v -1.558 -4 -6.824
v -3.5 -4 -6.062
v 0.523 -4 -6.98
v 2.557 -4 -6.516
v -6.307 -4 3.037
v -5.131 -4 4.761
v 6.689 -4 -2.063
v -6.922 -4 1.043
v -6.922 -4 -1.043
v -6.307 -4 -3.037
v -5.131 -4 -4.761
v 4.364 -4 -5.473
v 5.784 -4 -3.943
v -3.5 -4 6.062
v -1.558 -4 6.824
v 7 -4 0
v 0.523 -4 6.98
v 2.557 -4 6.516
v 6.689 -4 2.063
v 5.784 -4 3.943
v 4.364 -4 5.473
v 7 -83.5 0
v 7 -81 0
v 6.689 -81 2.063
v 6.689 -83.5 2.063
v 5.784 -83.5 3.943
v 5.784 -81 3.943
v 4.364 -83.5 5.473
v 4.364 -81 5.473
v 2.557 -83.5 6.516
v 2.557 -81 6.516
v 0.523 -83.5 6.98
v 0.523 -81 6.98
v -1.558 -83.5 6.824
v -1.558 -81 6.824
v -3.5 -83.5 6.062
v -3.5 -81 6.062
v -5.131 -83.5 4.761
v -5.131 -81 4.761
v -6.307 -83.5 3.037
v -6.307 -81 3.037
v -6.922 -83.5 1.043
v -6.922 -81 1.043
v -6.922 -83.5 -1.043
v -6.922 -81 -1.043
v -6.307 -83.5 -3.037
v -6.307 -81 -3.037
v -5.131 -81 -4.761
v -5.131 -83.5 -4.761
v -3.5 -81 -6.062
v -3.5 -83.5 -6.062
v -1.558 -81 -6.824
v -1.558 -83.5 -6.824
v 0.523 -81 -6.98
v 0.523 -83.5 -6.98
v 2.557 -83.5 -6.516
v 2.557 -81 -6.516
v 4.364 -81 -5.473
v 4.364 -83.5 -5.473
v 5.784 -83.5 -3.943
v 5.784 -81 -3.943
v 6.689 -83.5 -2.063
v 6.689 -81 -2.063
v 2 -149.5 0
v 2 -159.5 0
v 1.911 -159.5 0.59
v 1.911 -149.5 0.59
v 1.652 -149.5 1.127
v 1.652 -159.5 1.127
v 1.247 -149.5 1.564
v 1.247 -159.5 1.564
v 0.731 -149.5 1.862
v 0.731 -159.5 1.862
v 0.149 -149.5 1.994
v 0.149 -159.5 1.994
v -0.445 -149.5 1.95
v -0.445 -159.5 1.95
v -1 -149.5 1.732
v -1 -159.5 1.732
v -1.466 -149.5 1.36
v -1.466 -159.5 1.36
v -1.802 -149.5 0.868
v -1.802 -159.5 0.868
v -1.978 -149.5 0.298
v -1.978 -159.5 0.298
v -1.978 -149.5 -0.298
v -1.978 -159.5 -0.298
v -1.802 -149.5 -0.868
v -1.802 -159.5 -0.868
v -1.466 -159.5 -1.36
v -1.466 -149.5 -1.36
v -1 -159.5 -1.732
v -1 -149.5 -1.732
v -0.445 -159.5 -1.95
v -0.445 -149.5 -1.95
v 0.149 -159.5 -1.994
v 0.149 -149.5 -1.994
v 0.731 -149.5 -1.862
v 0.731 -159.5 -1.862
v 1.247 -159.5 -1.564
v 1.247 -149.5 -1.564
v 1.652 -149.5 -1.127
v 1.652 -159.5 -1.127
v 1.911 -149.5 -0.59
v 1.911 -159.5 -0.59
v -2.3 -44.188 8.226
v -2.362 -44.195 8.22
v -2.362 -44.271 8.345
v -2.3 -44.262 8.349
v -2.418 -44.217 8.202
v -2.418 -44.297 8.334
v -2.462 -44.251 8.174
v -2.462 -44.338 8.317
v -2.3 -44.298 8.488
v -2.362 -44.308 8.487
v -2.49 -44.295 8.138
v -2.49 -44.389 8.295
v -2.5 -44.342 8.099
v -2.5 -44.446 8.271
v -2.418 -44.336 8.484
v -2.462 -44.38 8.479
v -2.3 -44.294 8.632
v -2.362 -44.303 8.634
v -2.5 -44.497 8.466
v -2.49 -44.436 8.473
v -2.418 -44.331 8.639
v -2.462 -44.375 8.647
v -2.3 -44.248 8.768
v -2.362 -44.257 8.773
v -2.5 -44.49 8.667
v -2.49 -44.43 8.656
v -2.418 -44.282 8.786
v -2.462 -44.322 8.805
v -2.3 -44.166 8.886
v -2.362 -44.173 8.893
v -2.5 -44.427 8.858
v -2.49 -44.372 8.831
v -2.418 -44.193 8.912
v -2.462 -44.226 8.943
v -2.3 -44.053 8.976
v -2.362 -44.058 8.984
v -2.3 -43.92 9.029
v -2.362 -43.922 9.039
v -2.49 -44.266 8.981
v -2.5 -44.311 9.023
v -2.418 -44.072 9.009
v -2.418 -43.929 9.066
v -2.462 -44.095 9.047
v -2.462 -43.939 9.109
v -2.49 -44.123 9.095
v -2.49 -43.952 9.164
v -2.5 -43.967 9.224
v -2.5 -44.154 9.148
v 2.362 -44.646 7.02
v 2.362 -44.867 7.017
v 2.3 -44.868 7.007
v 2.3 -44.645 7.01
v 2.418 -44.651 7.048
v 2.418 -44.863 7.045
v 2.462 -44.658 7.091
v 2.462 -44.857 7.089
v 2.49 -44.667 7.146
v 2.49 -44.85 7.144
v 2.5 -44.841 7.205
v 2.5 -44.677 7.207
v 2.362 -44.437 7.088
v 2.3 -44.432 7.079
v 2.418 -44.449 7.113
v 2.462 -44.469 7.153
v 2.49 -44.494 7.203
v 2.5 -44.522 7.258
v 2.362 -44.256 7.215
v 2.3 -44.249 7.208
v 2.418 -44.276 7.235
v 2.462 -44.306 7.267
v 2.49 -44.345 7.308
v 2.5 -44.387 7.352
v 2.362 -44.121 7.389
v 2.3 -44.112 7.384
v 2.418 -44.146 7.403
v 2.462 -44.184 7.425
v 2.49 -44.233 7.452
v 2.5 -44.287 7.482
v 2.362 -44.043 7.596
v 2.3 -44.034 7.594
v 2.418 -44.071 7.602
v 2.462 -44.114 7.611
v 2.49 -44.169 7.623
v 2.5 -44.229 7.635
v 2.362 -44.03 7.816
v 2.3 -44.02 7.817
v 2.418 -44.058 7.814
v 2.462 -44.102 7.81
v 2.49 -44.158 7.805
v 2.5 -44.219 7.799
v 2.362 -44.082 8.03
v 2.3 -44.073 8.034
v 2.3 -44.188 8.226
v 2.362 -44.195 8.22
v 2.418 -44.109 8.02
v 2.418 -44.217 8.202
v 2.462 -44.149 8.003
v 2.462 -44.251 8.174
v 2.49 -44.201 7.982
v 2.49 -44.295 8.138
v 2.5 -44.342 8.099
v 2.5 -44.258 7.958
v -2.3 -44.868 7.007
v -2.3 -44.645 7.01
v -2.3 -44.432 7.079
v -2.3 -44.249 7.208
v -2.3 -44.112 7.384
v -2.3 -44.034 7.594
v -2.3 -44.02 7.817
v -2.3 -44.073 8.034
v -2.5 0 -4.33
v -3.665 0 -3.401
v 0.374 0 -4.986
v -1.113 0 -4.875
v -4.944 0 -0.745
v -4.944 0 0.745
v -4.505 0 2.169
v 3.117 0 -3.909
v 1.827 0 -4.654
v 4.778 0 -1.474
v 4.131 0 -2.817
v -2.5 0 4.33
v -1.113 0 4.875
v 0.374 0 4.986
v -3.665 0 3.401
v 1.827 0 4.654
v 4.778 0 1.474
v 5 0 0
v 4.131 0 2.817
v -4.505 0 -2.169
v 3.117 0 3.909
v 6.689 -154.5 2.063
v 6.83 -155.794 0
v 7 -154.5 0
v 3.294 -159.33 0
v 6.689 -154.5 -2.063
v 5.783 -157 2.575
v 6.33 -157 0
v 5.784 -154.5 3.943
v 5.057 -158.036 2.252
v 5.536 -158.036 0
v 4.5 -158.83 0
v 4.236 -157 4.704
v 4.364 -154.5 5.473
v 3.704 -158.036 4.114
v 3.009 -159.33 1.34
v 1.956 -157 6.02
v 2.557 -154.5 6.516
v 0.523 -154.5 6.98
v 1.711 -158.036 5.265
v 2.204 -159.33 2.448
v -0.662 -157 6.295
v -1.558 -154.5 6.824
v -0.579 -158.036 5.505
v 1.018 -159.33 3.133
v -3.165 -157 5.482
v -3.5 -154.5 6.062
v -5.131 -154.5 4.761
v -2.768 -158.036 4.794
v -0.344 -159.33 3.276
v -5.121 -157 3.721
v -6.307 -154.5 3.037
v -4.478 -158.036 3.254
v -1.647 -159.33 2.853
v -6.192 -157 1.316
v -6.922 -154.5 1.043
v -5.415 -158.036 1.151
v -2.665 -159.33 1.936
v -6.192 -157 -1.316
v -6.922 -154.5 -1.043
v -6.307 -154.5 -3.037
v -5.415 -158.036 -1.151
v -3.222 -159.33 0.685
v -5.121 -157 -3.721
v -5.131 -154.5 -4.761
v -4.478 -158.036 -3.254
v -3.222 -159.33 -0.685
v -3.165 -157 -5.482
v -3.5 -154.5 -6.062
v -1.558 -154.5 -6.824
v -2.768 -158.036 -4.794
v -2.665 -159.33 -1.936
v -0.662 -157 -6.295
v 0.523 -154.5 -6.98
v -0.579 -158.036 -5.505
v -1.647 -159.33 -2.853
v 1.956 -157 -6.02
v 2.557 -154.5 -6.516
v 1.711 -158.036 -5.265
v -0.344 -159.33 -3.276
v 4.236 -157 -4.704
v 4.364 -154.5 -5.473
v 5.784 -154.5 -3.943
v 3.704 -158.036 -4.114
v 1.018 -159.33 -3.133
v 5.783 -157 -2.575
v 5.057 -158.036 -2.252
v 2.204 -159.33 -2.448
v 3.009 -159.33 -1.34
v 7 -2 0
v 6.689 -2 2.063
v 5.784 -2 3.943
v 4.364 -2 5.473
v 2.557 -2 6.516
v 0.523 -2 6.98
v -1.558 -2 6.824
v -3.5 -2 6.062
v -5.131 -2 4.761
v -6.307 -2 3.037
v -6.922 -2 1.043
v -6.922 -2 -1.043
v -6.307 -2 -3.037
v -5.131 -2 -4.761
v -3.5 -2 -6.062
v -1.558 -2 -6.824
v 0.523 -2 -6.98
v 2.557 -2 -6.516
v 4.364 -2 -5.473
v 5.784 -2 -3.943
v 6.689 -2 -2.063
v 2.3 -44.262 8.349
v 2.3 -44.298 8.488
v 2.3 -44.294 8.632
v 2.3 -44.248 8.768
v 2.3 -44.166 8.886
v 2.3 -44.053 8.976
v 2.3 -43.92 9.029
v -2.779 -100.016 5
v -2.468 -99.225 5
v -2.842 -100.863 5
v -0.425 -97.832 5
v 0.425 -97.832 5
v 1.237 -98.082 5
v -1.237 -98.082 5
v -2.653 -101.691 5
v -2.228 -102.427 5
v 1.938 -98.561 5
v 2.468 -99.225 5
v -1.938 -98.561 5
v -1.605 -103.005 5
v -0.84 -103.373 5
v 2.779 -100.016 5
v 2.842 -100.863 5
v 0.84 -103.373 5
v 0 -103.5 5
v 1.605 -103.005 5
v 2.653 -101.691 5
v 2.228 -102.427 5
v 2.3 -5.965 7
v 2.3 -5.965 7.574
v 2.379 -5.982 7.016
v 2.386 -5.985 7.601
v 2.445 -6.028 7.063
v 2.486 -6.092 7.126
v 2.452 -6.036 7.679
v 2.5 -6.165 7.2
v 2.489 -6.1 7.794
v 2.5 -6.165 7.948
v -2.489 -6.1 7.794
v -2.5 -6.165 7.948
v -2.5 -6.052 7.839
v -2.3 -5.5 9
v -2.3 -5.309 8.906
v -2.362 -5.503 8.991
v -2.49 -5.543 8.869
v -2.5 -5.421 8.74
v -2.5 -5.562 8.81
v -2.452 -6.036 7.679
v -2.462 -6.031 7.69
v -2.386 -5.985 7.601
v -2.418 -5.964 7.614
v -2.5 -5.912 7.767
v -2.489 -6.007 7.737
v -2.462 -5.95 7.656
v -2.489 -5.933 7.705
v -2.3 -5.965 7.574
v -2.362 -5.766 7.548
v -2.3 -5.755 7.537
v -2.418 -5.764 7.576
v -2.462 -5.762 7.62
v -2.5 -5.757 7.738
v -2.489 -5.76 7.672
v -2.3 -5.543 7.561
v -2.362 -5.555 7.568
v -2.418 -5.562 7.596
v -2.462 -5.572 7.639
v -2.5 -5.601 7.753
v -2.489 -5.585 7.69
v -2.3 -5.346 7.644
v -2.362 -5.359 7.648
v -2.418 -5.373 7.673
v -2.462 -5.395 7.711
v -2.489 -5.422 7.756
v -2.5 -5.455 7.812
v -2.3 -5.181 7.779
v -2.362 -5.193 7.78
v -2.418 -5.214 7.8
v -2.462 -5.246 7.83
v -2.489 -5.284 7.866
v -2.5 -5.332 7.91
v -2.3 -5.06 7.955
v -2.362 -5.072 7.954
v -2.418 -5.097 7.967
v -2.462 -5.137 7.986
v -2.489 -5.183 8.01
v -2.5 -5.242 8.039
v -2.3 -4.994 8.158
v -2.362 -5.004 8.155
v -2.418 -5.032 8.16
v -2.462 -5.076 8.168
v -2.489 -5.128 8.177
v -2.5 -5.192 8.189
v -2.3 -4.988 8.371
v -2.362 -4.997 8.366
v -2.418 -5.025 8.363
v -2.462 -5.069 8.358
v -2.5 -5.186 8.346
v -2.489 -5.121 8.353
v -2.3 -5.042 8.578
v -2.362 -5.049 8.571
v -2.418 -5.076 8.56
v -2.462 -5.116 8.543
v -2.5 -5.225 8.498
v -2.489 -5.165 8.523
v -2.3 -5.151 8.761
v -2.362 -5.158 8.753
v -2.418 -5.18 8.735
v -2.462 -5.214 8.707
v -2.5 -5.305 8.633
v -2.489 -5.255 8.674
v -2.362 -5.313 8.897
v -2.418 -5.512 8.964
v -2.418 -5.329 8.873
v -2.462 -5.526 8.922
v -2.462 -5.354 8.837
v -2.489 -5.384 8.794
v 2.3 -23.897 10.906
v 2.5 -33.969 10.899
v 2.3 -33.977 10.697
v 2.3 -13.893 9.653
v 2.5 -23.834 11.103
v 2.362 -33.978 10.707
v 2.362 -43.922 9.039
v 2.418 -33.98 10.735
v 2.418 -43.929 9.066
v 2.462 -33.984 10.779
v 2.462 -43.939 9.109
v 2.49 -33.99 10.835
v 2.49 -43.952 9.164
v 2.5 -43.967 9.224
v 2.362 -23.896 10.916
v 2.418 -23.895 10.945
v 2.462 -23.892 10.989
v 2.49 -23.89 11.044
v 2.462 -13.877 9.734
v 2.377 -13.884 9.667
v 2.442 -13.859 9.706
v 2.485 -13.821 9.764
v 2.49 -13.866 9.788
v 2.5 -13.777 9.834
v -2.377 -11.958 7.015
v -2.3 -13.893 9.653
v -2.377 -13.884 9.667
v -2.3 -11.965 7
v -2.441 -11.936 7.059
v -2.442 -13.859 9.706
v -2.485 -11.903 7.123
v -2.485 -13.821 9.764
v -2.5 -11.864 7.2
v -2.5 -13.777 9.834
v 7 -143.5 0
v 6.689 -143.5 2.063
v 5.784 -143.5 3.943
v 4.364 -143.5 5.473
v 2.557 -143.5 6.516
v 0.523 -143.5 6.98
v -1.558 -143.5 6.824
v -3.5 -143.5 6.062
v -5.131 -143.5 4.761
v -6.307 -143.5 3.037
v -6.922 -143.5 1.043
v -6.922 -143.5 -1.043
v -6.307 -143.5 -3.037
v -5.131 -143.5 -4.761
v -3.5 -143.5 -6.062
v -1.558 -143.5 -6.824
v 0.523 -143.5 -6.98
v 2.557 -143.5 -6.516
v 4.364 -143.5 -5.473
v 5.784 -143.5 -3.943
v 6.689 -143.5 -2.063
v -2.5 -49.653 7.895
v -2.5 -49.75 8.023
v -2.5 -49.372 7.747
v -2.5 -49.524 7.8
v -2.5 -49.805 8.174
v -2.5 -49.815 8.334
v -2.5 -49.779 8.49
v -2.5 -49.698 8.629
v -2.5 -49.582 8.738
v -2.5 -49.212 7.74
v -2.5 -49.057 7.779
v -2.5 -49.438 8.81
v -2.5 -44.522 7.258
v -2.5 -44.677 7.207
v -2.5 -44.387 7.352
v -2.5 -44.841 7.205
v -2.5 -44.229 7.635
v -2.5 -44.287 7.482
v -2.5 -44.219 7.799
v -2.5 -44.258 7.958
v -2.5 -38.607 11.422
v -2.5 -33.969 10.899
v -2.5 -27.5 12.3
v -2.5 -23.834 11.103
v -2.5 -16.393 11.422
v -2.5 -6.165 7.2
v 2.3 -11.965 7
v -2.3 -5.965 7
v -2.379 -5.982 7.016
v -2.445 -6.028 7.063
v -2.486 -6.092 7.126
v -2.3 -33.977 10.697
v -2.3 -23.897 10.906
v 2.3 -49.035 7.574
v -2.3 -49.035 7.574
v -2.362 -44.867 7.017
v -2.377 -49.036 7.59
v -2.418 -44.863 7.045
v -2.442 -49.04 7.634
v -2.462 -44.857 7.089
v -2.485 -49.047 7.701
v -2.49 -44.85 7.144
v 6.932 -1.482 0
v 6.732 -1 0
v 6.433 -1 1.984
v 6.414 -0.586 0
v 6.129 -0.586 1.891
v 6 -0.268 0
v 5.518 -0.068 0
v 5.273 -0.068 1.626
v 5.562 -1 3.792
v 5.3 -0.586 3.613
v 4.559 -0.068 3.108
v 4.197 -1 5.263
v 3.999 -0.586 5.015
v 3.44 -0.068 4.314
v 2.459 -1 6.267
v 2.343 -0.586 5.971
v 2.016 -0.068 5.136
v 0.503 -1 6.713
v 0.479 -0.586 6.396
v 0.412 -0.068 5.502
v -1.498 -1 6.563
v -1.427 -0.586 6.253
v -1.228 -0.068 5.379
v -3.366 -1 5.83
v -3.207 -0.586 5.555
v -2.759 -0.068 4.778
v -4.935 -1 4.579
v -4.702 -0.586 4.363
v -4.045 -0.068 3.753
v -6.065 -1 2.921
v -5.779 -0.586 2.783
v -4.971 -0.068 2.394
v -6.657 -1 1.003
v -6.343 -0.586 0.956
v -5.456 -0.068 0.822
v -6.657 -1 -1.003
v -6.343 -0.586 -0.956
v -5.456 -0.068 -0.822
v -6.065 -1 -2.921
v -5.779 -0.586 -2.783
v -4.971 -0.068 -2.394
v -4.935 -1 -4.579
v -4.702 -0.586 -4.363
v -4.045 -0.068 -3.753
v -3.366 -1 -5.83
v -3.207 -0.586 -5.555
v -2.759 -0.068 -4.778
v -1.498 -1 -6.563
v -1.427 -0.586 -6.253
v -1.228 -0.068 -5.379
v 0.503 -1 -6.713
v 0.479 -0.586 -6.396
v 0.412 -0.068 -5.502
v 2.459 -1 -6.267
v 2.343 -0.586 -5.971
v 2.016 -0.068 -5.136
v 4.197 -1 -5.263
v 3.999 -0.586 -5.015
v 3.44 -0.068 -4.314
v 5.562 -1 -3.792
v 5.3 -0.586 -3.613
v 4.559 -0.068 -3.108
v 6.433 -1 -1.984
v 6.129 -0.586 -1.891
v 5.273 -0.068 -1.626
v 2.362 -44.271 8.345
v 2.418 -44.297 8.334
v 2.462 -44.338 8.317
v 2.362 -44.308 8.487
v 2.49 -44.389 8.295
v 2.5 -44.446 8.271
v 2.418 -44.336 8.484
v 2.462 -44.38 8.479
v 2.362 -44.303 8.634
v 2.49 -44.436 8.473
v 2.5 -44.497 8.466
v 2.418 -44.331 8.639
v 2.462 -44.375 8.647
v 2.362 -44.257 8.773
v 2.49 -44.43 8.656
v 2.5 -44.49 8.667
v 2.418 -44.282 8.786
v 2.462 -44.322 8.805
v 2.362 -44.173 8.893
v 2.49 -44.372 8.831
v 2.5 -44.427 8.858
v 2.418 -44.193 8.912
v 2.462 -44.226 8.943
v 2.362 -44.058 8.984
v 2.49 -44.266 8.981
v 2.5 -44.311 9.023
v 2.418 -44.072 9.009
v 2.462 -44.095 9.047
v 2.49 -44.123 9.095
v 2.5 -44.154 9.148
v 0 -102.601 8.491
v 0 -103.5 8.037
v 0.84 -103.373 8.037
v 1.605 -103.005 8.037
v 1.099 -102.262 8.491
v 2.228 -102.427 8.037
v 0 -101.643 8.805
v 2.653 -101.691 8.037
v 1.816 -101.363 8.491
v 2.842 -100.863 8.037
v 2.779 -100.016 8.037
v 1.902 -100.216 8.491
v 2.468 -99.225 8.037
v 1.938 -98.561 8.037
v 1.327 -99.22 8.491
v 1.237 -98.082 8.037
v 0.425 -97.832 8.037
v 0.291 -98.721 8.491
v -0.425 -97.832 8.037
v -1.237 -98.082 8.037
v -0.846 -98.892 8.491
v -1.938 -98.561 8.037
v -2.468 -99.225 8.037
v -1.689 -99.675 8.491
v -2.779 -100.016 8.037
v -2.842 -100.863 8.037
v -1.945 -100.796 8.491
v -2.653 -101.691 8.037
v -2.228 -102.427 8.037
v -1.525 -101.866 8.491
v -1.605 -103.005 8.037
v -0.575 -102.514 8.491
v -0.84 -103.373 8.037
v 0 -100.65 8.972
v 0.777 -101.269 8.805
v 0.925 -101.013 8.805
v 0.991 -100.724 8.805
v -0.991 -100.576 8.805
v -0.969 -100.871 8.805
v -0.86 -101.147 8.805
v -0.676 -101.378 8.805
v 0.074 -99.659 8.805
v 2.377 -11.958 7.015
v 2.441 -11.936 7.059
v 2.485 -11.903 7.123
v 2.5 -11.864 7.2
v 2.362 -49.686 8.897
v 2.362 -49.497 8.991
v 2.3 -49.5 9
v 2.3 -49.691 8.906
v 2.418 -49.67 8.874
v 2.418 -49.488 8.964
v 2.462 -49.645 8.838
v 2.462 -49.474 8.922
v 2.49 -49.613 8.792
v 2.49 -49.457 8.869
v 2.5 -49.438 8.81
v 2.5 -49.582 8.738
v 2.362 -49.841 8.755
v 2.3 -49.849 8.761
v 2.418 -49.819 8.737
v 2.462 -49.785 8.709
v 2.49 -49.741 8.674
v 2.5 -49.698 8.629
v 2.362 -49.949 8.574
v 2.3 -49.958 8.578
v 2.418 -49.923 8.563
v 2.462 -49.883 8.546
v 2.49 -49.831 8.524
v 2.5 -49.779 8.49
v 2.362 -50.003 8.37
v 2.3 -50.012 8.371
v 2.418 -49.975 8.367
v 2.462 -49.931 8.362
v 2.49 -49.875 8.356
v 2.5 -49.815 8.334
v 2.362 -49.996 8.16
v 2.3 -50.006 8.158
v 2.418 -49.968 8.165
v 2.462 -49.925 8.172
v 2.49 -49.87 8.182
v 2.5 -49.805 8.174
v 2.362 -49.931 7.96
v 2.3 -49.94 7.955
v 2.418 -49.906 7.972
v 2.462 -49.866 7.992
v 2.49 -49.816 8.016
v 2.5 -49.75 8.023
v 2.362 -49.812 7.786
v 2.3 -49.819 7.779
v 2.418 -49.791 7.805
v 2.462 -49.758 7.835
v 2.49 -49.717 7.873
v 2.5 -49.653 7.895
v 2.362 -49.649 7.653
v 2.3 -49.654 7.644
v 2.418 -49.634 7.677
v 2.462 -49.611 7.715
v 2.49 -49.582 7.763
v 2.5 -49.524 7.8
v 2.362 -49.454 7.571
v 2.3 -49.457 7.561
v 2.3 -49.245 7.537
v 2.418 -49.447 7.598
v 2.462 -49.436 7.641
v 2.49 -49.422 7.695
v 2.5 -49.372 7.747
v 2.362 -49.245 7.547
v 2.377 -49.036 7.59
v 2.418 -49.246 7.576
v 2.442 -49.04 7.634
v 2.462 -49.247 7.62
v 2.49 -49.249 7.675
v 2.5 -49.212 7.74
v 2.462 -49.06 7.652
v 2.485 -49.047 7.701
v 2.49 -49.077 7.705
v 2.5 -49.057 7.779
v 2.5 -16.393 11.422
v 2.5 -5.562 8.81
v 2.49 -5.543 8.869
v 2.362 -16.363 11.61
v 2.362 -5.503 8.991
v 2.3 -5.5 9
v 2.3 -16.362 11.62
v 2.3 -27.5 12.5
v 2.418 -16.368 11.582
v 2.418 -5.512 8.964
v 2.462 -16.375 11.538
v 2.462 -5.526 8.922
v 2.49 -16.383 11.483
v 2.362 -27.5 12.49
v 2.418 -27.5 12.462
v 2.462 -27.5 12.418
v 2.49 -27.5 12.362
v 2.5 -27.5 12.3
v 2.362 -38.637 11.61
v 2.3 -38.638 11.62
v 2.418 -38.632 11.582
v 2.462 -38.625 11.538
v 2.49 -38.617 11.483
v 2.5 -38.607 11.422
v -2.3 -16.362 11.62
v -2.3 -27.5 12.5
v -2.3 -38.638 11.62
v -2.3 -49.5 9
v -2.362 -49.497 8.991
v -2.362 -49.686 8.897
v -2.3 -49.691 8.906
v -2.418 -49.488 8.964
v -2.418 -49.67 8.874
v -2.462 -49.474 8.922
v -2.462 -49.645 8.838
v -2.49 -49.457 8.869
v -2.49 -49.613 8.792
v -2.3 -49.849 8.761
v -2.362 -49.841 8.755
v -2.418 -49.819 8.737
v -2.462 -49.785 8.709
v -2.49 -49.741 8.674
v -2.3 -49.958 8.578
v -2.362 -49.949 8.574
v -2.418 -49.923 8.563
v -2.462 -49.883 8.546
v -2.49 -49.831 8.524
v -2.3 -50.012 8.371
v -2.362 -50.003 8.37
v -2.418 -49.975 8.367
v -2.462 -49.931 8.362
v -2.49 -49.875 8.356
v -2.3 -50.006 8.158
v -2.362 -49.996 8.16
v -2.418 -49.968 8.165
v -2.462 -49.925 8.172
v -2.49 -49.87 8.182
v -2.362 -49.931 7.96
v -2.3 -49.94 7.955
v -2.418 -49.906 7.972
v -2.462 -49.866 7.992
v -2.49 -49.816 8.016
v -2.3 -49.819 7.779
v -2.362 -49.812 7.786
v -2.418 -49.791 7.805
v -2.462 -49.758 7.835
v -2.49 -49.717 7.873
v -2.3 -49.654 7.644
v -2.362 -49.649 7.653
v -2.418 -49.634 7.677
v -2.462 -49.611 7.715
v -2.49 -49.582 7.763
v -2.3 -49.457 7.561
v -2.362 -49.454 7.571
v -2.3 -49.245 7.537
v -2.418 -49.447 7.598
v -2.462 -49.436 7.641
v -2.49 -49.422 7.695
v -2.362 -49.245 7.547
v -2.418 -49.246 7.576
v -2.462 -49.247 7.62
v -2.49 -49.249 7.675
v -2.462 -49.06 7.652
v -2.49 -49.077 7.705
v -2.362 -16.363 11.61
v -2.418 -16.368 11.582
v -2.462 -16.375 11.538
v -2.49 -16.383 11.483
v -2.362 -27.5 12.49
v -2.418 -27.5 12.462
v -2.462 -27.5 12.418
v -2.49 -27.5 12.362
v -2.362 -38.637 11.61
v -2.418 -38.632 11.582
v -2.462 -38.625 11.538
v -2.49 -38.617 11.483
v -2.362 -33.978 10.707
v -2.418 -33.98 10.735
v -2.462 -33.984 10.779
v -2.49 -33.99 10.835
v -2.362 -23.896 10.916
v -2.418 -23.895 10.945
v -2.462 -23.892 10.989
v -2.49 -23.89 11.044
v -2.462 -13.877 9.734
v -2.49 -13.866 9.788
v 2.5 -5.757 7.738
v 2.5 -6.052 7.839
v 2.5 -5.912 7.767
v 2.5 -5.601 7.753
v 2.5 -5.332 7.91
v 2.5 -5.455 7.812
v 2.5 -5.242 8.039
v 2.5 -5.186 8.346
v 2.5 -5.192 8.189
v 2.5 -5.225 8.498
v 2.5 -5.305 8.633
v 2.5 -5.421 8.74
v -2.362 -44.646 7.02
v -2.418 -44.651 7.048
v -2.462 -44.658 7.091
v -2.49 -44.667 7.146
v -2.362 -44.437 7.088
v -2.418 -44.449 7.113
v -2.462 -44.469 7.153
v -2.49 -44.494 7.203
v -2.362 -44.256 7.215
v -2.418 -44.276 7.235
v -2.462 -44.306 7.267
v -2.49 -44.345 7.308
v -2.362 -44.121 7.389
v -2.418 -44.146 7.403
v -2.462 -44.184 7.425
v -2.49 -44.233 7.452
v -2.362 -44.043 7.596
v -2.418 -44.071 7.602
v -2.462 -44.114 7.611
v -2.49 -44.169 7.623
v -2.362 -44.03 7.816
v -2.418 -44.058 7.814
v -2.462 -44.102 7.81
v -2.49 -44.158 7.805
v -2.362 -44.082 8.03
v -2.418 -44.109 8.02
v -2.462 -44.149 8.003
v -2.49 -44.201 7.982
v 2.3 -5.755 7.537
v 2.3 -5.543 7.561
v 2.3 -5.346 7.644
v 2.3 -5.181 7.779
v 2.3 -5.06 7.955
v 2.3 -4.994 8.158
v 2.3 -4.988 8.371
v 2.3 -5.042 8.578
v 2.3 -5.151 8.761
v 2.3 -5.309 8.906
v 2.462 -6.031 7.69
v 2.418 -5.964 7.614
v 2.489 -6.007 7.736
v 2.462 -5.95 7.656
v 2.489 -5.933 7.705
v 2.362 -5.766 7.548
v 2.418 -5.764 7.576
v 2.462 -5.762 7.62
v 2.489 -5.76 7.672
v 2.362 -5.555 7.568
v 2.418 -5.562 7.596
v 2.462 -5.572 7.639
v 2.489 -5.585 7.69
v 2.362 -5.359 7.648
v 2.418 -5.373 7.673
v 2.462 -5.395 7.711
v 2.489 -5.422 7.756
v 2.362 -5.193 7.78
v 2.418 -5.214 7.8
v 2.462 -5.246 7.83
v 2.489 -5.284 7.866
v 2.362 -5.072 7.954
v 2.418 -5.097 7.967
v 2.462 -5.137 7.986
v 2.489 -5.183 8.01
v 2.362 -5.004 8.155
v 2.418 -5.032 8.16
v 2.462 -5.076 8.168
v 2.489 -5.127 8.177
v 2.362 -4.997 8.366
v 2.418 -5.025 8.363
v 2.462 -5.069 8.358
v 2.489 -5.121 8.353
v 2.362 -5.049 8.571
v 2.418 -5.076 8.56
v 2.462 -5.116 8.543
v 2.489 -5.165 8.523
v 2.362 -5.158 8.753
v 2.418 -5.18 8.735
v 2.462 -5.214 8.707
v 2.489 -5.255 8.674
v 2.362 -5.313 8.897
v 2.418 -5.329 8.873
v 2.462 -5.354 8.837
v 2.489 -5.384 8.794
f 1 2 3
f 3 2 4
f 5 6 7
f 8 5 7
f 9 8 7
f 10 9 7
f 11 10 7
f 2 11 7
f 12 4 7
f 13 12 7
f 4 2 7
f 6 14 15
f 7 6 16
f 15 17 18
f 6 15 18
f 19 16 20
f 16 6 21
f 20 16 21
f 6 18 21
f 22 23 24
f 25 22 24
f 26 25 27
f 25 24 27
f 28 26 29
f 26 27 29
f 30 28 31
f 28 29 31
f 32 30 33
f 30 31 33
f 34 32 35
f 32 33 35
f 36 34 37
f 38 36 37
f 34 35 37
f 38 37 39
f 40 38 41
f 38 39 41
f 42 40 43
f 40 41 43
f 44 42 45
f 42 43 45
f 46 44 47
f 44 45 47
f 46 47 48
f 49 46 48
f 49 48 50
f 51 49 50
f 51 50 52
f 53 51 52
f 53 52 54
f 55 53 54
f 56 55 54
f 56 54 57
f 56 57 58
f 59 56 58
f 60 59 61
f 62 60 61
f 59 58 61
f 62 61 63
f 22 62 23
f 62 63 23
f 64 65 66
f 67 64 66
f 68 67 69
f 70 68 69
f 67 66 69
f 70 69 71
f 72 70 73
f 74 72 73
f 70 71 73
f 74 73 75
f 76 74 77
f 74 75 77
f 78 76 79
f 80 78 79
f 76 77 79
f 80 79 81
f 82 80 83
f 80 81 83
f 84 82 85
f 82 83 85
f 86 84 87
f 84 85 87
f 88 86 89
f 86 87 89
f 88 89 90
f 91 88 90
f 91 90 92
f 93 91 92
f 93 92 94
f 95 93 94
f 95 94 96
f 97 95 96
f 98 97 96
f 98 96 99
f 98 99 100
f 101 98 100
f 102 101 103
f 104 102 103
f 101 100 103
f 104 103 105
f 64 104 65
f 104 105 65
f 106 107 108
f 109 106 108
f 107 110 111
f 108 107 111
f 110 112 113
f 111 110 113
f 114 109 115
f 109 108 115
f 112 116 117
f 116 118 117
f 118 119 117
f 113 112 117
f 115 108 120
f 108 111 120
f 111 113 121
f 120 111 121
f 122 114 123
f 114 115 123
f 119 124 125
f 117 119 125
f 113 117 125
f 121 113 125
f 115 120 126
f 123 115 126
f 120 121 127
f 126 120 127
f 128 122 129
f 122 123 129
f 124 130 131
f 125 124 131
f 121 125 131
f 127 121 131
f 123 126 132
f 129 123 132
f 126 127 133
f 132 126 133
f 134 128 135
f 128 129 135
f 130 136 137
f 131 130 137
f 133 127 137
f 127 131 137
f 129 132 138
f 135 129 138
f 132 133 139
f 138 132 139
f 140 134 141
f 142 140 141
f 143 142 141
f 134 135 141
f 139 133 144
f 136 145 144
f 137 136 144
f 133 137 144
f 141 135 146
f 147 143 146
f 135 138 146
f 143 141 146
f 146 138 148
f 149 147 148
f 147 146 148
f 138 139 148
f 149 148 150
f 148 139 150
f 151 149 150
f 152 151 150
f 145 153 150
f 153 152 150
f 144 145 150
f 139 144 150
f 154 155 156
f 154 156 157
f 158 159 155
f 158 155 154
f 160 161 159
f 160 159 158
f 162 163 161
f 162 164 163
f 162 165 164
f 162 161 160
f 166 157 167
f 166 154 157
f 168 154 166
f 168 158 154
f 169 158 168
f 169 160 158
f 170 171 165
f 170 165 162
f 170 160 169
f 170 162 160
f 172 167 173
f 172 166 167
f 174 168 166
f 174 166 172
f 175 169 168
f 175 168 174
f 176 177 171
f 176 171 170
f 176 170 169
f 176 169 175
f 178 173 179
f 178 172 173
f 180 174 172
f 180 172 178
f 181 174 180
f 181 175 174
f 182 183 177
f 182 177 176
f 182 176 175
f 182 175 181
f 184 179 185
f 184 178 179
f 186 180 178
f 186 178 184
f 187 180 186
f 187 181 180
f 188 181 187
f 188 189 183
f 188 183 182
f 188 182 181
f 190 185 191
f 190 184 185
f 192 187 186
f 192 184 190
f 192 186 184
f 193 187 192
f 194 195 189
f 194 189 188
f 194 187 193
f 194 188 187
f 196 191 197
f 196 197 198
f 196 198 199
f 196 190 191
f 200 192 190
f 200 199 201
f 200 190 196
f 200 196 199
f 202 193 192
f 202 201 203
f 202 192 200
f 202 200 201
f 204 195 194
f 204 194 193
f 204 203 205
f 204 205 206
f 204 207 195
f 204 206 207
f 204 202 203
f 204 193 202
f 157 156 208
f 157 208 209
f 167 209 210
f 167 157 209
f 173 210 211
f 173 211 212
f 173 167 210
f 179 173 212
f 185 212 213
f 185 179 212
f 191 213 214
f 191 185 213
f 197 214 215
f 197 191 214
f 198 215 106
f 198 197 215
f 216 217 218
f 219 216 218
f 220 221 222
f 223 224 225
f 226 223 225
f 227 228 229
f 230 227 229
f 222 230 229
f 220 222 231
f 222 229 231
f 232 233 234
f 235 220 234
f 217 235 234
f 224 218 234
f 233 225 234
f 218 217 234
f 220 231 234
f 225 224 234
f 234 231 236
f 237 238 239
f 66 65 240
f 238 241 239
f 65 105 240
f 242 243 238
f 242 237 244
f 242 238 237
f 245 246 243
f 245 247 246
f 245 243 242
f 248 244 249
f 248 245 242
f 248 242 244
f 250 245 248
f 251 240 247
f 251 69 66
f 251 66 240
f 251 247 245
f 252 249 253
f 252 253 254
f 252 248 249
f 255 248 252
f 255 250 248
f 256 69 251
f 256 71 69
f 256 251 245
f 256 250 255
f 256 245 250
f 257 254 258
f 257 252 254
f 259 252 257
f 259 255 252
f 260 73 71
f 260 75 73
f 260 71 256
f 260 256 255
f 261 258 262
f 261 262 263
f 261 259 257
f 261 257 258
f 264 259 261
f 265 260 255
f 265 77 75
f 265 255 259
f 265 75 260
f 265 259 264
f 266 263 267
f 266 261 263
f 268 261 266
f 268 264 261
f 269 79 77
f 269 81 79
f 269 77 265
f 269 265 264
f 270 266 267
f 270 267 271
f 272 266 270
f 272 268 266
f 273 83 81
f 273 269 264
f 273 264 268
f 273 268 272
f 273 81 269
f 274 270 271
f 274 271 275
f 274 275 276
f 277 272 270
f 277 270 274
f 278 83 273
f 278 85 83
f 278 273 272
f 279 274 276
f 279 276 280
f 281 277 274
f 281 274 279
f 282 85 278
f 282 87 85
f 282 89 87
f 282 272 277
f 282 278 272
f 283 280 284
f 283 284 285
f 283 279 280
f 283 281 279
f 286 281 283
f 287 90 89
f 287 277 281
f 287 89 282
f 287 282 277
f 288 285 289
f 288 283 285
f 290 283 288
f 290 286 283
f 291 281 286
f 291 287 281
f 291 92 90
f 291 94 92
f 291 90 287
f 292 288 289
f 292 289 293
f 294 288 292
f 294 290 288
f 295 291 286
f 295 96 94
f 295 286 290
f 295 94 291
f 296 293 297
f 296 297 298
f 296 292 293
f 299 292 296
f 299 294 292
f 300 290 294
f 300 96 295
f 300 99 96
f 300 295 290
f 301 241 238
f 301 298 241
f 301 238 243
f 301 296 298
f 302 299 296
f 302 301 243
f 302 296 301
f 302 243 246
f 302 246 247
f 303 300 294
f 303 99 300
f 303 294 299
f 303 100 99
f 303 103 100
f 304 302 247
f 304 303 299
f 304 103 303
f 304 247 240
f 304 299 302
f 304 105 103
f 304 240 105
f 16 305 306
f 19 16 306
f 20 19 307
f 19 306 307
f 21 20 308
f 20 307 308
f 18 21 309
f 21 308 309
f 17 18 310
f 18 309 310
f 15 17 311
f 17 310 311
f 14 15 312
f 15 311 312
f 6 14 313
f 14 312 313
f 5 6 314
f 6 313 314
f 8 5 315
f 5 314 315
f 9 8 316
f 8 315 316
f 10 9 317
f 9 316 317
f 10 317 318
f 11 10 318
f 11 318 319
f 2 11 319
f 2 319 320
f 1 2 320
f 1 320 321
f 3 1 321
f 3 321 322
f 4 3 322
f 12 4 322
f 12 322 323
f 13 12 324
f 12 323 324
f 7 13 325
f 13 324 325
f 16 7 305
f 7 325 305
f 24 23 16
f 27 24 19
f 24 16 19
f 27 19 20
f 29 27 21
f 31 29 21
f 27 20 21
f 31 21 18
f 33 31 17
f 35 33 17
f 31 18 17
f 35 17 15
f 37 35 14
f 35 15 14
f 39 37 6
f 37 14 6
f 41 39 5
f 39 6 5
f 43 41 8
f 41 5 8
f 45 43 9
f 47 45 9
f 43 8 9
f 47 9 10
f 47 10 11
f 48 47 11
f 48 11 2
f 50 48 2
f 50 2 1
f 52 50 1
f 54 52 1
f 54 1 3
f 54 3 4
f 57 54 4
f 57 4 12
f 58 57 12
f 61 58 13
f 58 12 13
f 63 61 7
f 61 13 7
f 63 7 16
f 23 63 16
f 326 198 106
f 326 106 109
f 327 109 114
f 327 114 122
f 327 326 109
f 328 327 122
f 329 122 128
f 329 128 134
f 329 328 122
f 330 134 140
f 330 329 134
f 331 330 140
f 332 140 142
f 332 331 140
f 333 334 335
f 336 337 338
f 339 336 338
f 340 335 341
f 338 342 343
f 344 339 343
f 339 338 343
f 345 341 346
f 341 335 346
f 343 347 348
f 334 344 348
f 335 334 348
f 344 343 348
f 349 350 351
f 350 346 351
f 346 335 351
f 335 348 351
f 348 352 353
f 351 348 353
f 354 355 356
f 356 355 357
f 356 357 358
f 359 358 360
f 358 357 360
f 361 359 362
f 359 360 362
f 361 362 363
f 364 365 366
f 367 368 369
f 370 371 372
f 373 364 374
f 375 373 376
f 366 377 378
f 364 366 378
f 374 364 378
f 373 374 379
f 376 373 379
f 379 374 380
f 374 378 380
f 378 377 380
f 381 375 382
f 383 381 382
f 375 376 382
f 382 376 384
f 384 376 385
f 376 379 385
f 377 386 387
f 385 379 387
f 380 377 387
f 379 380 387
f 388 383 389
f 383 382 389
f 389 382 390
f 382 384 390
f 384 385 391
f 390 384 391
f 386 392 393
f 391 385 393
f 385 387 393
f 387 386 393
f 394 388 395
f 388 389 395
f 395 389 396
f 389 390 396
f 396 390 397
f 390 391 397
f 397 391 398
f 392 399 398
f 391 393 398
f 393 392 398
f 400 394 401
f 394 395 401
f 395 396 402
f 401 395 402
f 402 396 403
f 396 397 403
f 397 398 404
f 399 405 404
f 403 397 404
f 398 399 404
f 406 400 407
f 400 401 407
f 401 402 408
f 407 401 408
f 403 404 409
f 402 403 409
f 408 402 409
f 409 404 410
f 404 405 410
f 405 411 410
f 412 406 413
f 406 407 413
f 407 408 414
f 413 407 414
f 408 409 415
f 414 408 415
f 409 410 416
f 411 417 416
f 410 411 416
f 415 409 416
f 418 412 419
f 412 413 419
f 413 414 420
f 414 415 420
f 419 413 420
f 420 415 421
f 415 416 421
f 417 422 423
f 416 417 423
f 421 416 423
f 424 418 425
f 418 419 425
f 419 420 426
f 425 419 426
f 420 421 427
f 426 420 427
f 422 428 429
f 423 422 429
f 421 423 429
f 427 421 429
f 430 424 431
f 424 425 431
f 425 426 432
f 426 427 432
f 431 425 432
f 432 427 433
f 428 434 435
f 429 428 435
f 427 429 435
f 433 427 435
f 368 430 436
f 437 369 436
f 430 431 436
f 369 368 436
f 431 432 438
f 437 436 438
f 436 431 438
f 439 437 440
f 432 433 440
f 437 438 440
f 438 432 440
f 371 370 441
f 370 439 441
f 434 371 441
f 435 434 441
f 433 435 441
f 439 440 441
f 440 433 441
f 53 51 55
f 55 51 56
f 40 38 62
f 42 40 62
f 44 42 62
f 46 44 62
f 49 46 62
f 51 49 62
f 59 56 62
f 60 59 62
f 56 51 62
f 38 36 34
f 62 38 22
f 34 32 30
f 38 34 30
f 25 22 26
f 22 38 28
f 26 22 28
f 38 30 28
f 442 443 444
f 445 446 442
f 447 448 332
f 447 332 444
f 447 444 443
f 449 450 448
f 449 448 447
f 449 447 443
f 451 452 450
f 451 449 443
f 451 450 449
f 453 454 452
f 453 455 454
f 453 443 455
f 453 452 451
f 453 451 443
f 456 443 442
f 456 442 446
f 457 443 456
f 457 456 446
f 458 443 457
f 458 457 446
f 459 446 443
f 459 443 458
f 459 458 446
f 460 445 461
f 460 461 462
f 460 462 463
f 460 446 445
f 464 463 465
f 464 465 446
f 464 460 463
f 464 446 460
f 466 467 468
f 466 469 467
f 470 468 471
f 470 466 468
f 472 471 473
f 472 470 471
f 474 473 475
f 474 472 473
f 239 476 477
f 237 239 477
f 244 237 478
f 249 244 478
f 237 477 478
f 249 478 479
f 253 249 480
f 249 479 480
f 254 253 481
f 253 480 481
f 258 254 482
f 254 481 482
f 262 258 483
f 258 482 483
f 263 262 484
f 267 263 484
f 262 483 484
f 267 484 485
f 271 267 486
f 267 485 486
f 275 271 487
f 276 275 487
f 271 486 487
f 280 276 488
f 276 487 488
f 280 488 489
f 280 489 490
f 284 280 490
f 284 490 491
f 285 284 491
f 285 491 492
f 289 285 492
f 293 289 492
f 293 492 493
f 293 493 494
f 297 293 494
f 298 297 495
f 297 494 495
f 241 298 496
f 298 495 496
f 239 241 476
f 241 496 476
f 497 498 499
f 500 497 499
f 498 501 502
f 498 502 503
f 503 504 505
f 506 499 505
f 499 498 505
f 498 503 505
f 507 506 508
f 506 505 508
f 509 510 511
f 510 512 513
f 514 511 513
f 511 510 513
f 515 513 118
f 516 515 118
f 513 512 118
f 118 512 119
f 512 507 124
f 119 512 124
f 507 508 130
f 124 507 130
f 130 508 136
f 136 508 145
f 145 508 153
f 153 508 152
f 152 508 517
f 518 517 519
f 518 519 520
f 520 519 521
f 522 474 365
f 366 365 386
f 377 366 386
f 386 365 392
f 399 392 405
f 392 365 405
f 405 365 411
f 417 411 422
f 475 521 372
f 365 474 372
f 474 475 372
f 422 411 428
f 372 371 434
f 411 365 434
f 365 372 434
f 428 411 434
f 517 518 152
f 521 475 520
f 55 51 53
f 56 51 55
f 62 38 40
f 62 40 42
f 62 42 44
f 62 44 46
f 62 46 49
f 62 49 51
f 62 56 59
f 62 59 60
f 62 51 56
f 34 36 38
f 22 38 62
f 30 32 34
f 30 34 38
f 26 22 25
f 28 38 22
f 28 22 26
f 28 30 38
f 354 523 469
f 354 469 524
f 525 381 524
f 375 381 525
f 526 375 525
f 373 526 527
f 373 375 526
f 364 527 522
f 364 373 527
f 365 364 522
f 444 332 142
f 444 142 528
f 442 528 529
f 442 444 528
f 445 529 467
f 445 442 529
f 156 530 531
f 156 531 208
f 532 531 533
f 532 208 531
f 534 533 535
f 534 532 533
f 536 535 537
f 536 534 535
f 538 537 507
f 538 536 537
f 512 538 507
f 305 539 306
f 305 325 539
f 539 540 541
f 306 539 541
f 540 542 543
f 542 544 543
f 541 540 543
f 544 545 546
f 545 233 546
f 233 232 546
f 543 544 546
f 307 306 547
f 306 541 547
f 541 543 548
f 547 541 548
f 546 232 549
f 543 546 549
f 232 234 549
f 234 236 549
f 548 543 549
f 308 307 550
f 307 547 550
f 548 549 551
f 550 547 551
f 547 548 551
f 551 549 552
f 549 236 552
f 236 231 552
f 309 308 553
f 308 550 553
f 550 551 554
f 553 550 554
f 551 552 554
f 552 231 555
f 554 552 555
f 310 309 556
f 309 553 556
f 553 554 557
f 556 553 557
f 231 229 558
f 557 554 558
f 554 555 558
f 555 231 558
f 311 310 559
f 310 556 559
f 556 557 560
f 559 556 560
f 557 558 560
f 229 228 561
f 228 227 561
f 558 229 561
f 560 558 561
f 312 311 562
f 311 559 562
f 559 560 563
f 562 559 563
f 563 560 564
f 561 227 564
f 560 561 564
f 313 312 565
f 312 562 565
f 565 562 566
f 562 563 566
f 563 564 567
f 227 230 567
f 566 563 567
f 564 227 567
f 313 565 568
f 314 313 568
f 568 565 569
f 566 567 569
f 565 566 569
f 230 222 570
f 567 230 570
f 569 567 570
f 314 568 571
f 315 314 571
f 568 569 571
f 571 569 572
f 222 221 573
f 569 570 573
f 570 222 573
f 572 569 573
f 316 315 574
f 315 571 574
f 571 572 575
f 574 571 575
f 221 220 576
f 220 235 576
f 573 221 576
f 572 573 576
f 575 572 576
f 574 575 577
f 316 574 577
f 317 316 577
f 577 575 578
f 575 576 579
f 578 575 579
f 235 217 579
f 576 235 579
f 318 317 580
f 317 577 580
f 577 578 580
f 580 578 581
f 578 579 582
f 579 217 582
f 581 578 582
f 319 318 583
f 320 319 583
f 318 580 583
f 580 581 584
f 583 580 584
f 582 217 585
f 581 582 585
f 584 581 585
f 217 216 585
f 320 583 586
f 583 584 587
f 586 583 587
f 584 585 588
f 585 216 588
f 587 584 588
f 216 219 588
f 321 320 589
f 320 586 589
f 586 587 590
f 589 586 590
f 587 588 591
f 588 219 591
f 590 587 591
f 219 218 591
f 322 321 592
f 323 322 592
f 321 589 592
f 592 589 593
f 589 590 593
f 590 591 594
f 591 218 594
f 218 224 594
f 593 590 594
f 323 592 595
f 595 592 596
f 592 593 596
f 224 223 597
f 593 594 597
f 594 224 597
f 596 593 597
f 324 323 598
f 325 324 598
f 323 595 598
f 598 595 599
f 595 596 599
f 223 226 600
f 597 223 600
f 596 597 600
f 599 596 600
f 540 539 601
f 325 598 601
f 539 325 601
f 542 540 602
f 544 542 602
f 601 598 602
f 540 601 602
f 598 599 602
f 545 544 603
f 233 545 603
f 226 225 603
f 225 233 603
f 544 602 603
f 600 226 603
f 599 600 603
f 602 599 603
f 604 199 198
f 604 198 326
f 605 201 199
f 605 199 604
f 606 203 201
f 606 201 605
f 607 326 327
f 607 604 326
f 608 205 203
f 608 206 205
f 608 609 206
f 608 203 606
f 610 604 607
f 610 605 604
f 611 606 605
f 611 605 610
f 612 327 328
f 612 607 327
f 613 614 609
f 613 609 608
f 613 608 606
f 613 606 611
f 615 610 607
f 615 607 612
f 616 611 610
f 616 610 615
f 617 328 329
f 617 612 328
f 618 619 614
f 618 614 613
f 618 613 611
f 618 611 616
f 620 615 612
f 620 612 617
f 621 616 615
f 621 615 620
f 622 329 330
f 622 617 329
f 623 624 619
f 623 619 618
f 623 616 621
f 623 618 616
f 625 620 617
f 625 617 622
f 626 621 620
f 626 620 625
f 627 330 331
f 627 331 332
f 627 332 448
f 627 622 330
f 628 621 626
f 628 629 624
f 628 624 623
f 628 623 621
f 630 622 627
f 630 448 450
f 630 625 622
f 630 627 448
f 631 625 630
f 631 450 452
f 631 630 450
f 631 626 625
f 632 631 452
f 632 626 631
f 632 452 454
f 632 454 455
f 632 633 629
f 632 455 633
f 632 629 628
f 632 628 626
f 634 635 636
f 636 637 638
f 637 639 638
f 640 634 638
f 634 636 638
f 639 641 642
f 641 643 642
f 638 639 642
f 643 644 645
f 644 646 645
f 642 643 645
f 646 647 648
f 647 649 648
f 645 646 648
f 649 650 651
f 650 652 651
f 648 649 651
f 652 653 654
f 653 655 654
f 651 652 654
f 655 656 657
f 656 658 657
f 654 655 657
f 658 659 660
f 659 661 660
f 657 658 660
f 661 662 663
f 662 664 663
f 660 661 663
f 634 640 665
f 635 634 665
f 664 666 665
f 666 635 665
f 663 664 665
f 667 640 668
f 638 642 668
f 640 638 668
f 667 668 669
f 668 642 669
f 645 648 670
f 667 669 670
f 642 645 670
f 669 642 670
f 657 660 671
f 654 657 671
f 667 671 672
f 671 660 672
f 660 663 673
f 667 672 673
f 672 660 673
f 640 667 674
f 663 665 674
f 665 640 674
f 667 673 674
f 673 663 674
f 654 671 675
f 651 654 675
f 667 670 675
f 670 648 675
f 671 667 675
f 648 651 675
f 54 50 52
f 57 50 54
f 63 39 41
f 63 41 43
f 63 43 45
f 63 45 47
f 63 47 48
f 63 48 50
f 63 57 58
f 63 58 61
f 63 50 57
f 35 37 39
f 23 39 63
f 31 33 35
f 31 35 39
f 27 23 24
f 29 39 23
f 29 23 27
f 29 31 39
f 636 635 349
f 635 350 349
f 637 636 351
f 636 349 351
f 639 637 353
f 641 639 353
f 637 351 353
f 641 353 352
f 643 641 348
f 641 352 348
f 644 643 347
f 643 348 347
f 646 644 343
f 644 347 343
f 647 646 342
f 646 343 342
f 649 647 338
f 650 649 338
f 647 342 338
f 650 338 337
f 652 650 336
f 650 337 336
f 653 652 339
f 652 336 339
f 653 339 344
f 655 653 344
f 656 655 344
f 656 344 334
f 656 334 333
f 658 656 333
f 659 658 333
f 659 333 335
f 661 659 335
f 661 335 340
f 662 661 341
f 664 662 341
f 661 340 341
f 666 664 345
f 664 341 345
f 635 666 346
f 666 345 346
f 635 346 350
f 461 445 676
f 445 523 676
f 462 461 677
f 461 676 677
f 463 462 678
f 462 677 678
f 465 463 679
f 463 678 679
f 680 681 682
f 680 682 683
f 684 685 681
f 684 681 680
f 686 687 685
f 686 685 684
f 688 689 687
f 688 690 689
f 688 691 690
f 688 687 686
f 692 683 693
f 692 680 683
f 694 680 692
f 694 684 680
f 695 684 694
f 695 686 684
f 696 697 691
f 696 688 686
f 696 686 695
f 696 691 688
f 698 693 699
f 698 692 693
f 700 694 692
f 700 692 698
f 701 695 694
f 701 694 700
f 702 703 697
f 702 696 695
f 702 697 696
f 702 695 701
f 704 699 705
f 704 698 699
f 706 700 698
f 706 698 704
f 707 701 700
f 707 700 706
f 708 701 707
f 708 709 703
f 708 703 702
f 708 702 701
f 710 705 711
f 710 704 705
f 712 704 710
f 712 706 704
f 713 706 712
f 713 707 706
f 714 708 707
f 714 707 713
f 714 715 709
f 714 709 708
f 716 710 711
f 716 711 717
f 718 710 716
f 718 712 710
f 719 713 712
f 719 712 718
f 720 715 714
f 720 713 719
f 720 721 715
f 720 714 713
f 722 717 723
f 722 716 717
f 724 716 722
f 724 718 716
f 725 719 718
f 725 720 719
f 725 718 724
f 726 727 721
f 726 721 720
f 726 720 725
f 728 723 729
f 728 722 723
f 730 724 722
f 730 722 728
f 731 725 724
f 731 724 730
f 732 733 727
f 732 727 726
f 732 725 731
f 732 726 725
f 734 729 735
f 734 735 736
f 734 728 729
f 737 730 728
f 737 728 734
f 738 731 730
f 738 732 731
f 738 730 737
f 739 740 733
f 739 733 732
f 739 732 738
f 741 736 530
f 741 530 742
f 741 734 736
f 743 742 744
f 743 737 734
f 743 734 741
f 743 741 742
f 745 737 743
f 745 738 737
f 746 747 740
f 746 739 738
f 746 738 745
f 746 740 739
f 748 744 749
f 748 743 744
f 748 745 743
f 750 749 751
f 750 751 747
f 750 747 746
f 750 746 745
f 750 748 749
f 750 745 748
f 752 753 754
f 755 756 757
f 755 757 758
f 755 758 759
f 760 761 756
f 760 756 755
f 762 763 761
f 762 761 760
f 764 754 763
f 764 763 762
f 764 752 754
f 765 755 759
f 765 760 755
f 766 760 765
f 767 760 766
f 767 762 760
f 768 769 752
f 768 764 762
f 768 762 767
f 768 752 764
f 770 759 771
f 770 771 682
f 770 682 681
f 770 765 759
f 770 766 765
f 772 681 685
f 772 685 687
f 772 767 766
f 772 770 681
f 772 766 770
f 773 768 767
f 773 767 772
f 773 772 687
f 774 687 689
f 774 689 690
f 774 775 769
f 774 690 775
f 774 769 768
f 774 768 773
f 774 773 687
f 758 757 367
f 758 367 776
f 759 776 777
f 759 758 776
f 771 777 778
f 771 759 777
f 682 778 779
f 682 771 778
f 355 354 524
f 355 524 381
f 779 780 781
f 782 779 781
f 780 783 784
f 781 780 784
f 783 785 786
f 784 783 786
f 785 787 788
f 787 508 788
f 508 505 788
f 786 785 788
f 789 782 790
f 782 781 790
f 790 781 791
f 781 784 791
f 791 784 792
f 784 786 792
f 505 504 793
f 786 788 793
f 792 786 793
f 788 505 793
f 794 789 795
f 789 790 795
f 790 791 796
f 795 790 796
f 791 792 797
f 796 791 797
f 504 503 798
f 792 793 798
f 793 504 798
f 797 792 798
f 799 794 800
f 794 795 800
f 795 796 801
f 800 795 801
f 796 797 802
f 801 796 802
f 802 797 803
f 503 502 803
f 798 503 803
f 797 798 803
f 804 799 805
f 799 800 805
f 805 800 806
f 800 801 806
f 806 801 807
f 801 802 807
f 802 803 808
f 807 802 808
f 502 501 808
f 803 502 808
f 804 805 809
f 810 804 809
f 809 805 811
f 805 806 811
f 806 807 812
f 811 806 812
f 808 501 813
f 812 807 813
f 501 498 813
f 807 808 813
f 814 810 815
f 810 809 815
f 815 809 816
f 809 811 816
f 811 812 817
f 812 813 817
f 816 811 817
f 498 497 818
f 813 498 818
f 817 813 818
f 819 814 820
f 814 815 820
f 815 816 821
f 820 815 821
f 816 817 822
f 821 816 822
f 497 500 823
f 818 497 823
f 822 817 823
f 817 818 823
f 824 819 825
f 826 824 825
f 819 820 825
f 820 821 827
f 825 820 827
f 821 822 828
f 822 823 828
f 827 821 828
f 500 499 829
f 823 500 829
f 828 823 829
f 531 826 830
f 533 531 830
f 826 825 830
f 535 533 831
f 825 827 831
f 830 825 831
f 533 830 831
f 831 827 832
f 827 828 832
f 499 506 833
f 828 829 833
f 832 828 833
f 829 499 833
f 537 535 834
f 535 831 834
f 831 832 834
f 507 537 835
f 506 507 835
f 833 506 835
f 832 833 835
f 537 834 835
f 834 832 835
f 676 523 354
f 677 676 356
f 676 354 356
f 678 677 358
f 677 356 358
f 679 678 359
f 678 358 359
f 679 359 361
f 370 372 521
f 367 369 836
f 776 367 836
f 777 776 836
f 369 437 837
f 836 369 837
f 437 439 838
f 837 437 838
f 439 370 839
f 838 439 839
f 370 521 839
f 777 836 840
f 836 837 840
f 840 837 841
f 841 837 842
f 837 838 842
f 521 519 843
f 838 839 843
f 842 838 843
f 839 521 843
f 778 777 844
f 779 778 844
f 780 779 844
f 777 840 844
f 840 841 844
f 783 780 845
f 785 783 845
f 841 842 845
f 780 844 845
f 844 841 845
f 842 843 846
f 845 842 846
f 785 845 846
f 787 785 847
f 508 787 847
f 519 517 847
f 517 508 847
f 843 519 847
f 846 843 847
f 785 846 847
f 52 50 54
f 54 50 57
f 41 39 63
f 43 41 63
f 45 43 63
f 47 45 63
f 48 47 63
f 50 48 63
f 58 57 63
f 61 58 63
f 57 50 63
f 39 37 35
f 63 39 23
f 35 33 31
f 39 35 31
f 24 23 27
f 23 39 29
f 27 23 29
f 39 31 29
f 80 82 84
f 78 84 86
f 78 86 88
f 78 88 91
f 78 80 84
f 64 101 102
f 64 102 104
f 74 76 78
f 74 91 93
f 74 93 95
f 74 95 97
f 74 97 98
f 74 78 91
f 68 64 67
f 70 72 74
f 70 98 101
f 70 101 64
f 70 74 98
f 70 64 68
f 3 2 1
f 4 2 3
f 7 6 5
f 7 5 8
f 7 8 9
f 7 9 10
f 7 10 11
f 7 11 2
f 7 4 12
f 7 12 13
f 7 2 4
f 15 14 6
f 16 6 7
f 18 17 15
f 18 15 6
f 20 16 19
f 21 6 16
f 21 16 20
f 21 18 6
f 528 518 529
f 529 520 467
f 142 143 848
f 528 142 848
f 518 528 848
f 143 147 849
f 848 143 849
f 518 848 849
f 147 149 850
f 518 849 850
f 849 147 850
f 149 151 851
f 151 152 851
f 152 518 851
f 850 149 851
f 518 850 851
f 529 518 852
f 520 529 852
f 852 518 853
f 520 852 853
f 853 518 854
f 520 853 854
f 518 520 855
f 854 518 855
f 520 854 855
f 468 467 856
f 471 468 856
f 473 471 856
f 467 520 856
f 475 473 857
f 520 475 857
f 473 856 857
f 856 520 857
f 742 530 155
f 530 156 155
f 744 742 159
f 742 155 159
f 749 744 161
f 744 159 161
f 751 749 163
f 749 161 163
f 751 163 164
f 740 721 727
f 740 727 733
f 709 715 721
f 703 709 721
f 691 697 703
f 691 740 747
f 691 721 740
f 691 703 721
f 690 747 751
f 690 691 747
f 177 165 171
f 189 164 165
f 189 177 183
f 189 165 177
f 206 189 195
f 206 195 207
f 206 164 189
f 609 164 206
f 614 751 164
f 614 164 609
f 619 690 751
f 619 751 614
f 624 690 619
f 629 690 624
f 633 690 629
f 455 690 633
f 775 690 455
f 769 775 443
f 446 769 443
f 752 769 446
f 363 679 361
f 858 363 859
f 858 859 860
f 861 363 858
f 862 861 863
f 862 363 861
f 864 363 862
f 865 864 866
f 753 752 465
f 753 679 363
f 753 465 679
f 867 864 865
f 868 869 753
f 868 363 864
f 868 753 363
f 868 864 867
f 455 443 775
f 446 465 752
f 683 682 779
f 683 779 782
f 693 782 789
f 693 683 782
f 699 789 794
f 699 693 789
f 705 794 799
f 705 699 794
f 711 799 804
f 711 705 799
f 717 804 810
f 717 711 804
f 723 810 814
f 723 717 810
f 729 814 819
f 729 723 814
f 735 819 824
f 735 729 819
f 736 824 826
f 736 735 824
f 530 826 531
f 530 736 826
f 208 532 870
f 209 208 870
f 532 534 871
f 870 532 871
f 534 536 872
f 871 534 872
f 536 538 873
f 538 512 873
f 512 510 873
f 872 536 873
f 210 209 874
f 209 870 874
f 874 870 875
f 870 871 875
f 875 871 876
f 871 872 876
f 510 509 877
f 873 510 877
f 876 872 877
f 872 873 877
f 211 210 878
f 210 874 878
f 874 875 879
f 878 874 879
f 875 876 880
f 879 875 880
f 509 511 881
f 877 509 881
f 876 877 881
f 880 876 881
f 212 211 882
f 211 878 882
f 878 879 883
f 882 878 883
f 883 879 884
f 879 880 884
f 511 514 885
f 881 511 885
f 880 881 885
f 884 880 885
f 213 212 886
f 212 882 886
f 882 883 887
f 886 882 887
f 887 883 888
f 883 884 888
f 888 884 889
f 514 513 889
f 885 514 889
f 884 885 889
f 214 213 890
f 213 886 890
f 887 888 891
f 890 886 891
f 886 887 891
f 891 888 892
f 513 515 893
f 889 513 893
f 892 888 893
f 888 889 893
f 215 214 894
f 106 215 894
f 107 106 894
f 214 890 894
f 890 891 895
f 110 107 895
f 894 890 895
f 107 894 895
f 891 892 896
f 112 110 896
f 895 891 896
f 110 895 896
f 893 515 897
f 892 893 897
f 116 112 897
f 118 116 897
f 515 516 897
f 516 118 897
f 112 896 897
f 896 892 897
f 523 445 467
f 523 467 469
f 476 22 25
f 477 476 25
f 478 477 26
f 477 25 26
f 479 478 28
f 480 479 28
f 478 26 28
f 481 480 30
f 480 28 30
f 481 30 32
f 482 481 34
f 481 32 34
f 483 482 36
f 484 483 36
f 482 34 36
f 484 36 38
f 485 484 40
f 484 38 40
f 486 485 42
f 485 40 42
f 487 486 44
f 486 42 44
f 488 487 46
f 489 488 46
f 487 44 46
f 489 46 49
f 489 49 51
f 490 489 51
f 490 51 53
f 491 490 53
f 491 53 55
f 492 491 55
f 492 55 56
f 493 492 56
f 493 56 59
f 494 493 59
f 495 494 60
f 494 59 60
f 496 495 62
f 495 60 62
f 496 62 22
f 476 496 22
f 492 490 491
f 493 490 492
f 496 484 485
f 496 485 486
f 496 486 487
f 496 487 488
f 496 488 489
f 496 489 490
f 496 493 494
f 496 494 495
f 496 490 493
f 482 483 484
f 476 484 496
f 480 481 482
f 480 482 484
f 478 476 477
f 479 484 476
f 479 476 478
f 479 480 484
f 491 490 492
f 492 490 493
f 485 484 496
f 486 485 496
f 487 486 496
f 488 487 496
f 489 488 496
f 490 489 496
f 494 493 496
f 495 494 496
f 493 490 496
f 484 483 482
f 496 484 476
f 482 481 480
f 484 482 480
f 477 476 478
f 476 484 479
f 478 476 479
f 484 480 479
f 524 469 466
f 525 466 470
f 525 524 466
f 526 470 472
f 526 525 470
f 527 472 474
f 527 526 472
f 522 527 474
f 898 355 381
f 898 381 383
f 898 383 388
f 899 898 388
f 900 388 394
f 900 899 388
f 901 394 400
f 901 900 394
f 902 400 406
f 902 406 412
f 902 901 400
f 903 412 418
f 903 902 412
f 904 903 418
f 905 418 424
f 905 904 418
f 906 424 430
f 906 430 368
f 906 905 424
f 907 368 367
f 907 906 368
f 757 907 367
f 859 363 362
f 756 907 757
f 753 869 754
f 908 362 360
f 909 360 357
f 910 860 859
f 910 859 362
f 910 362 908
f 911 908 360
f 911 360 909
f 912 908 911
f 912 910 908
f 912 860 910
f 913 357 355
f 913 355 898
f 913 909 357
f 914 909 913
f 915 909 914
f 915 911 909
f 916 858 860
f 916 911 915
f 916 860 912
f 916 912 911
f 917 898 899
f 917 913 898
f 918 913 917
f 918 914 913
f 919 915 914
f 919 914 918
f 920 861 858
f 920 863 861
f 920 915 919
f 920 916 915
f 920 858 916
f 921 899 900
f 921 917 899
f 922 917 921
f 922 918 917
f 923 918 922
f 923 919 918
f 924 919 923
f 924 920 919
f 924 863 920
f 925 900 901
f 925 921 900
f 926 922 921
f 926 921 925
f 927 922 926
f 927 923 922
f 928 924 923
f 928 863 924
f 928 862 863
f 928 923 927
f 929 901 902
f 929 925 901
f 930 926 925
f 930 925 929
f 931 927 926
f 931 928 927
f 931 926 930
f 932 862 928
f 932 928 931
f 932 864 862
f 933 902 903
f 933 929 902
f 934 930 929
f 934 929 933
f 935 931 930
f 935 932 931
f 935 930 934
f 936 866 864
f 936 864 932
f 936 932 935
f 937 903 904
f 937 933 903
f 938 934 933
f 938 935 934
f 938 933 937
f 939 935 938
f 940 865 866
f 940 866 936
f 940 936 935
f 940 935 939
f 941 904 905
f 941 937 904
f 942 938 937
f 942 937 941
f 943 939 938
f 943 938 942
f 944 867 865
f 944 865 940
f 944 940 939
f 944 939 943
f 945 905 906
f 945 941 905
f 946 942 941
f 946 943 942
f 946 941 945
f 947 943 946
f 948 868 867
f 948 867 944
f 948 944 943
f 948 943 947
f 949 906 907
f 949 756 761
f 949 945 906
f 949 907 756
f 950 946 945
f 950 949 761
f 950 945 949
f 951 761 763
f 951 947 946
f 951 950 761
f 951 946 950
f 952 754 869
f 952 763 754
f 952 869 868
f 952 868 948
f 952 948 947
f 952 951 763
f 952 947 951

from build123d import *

# Parameters (mm, degrees)
F0_R           = 7
F1_DEPTH       = 4
F2_R           = 2
F3_DEPTH       = 77
F4_DEPTH       = 2.5
F5_DEPTH       = 60
F6_DEPTH       = 16
F7_R           = 5
F8_DEPTH       = 10
F10_DEPTH      = 2.5
F10_DEPTH_BACK = 2.5
F11_R          = 0.2


with BuildPart() as f1:
    # F0 (on Front) → F1 (new body)
    with BuildSketch(Plane.XZ):
        Circle(F0_R)
    extrude(amount=F1_DEPTH)

    # F2
    f2_edges = [f1.edges().sort_by_distance(p)[0] for p in [
        (-7, 0, 0),
    ]]
    fillet(f2_edges, radius=F2_R)


with BuildPart() as f3:
    # F3 (new): a face of the model
    f3_faces = [f1.part.faces().sort_by_distance(p)[0] for p in [
        (0, -4, 0),
    ]]
    extrude(f3_faces, amount=F3_DEPTH)


with BuildPart() as f4:
    # F4 (new): a face of the model
    f4_faces = [f3.part.faces().sort_by_distance(p)[0] for p in [
        (0, -81, 0),
    ]]
    extrude(f4_faces, amount=F4_DEPTH)


with BuildPart() as f5:
    # F5 (new): a face of the model
    f5_faces = [f4.part.faces().sort_by_distance(p)[0] for p in [
        (0, -83.5, 0),
    ]]
    extrude(f5_faces, amount=F5_DEPTH)


with BuildPart() as f6:
    # F6 (new): a face of the model
    f6_faces = [f5.part.faces().sort_by_distance(p)[0] for p in [
        (0, -143.5, 0),
    ]]
    extrude(f6_faces, amount=F6_DEPTH)

    # F7
    f7_edges = [f6.edges().sort_by_distance(p)[0] for p in [
        (-7, -159.5, 0),
    ]]
    fillet(f7_edges, radius=F7_R)

    # F8 (cut): a face of the model
    f8_faces = [f6.faces().sort_by_distance(p)[0] for p in [
        (0, -159.5, 0),
    ]]
    extrude(f8_faces, amount=-F8_DEPTH, mode=Mode.SUBTRACT)


with BuildPart() as f10:
    # F9 (on Right) → F10 (new body, two sides)
    with BuildSketch(Plane.YZ) as f10_sk:
        with BuildLine():
            ThreePointArc((-5.9654911839, 7.5740554156), (-5.0197732997, 8.0542821159), (-5.5, 9))
            ThreePointArc((-5.5, 9), (-27.5, 12.5), (-49.5, 9))
            ThreePointArc((-49.5, 9), (-49.9802267003, 8.0542821159), (-49.0345088161, 7.5740554156))
            Line((-49.0345088161, 7.5740554156), (-44.8684313642, 7.0068558528))
            ThreePointArc((-44.8684313642, 7.0068558528), (-44.1123799471, 7.3844327142), (-44.1877897806, 8.2261520193))
            ThreePointArc((-44.1877897806, 8.2261520193), (-44.2757766406, 8.7018356298), (-43.9197904076, 9.0293877428))
            ThreePointArc((-43.9197904076, 9.0293877428), (-28.9404687163, 10.9850476419), (-13.8928819069, 9.6528257448))
            Line((-13.8928819069, 9.6528257448), (-11.9654911839, 7))
            Line((-11.9654911839, 7), (-5.9654911839, 7))
            Line((-5.9654911839, 7), (-5.9654911839, 7.5740554156))
        make_face()
    extrude(amount=F10_DEPTH)
    extrude(f10_sk.sketch, amount=-F10_DEPTH_BACK)

    # F11
    f11_edges = [f10.edges().sort_by_distance(p)[0] for p in [
        (2.5, -5.019773, 8.054282),
        (2.5, -27.5, 12.5),
        (2.5, -49.980227, 8.054282),
        (2.5, -46.95147, 7.290456),
        (2.5, -44.11238, 7.384433),
        (2.5, -44.275777, 8.701836),
        (2.5, -28.940469, 10.985048),
        (2.5, -12.929187, 8.326413),
        (2.5, -8.965491, 7),
        (2.5, -5.965491, 7.287028),
        (-2.5, -5.019773, 8.054282),
        (-2.5, -27.5, 12.5),
        (-2.5, -49.980227, 8.054282),
        (-2.5, -46.95147, 7.290456),
        (-2.5, -44.11238, 7.384433),
        (-2.5, -44.275777, 8.701836),
        (-2.5, -28.940469, 10.985048),
        (-2.5, -12.929187, 8.326413),
        (-2.5, -8.965491, 7),
        (-2.5, -5.965491, 7.287028),
    ]]
    fillet(f11_edges, radius=F11_R)


with BuildPart() as f13:
    # F12 (on Right) → F13 (revolve)
    with BuildSketch(Plane.YZ):
        with BuildLine():
            Line((-103.5, 8.03731), (-103.5, 5))
            Line((-103.5, 5), (-100.65, 5))
            Line((-100.65, 5), (-100.65, 8.9721514395))
            ThreePointArc((-100.65, 8.9721514395), (-102.1279850324, 8.6662632921), (-103.5, 8.03731))
        make_face()
    revolve(axis=Axis((0, -100.65, 6.9860757197), (0, 0, 1)))


solid = Compound([f1.part, f3.part, f4.part, f5.part, f6.part, f10.part, f13.part])
